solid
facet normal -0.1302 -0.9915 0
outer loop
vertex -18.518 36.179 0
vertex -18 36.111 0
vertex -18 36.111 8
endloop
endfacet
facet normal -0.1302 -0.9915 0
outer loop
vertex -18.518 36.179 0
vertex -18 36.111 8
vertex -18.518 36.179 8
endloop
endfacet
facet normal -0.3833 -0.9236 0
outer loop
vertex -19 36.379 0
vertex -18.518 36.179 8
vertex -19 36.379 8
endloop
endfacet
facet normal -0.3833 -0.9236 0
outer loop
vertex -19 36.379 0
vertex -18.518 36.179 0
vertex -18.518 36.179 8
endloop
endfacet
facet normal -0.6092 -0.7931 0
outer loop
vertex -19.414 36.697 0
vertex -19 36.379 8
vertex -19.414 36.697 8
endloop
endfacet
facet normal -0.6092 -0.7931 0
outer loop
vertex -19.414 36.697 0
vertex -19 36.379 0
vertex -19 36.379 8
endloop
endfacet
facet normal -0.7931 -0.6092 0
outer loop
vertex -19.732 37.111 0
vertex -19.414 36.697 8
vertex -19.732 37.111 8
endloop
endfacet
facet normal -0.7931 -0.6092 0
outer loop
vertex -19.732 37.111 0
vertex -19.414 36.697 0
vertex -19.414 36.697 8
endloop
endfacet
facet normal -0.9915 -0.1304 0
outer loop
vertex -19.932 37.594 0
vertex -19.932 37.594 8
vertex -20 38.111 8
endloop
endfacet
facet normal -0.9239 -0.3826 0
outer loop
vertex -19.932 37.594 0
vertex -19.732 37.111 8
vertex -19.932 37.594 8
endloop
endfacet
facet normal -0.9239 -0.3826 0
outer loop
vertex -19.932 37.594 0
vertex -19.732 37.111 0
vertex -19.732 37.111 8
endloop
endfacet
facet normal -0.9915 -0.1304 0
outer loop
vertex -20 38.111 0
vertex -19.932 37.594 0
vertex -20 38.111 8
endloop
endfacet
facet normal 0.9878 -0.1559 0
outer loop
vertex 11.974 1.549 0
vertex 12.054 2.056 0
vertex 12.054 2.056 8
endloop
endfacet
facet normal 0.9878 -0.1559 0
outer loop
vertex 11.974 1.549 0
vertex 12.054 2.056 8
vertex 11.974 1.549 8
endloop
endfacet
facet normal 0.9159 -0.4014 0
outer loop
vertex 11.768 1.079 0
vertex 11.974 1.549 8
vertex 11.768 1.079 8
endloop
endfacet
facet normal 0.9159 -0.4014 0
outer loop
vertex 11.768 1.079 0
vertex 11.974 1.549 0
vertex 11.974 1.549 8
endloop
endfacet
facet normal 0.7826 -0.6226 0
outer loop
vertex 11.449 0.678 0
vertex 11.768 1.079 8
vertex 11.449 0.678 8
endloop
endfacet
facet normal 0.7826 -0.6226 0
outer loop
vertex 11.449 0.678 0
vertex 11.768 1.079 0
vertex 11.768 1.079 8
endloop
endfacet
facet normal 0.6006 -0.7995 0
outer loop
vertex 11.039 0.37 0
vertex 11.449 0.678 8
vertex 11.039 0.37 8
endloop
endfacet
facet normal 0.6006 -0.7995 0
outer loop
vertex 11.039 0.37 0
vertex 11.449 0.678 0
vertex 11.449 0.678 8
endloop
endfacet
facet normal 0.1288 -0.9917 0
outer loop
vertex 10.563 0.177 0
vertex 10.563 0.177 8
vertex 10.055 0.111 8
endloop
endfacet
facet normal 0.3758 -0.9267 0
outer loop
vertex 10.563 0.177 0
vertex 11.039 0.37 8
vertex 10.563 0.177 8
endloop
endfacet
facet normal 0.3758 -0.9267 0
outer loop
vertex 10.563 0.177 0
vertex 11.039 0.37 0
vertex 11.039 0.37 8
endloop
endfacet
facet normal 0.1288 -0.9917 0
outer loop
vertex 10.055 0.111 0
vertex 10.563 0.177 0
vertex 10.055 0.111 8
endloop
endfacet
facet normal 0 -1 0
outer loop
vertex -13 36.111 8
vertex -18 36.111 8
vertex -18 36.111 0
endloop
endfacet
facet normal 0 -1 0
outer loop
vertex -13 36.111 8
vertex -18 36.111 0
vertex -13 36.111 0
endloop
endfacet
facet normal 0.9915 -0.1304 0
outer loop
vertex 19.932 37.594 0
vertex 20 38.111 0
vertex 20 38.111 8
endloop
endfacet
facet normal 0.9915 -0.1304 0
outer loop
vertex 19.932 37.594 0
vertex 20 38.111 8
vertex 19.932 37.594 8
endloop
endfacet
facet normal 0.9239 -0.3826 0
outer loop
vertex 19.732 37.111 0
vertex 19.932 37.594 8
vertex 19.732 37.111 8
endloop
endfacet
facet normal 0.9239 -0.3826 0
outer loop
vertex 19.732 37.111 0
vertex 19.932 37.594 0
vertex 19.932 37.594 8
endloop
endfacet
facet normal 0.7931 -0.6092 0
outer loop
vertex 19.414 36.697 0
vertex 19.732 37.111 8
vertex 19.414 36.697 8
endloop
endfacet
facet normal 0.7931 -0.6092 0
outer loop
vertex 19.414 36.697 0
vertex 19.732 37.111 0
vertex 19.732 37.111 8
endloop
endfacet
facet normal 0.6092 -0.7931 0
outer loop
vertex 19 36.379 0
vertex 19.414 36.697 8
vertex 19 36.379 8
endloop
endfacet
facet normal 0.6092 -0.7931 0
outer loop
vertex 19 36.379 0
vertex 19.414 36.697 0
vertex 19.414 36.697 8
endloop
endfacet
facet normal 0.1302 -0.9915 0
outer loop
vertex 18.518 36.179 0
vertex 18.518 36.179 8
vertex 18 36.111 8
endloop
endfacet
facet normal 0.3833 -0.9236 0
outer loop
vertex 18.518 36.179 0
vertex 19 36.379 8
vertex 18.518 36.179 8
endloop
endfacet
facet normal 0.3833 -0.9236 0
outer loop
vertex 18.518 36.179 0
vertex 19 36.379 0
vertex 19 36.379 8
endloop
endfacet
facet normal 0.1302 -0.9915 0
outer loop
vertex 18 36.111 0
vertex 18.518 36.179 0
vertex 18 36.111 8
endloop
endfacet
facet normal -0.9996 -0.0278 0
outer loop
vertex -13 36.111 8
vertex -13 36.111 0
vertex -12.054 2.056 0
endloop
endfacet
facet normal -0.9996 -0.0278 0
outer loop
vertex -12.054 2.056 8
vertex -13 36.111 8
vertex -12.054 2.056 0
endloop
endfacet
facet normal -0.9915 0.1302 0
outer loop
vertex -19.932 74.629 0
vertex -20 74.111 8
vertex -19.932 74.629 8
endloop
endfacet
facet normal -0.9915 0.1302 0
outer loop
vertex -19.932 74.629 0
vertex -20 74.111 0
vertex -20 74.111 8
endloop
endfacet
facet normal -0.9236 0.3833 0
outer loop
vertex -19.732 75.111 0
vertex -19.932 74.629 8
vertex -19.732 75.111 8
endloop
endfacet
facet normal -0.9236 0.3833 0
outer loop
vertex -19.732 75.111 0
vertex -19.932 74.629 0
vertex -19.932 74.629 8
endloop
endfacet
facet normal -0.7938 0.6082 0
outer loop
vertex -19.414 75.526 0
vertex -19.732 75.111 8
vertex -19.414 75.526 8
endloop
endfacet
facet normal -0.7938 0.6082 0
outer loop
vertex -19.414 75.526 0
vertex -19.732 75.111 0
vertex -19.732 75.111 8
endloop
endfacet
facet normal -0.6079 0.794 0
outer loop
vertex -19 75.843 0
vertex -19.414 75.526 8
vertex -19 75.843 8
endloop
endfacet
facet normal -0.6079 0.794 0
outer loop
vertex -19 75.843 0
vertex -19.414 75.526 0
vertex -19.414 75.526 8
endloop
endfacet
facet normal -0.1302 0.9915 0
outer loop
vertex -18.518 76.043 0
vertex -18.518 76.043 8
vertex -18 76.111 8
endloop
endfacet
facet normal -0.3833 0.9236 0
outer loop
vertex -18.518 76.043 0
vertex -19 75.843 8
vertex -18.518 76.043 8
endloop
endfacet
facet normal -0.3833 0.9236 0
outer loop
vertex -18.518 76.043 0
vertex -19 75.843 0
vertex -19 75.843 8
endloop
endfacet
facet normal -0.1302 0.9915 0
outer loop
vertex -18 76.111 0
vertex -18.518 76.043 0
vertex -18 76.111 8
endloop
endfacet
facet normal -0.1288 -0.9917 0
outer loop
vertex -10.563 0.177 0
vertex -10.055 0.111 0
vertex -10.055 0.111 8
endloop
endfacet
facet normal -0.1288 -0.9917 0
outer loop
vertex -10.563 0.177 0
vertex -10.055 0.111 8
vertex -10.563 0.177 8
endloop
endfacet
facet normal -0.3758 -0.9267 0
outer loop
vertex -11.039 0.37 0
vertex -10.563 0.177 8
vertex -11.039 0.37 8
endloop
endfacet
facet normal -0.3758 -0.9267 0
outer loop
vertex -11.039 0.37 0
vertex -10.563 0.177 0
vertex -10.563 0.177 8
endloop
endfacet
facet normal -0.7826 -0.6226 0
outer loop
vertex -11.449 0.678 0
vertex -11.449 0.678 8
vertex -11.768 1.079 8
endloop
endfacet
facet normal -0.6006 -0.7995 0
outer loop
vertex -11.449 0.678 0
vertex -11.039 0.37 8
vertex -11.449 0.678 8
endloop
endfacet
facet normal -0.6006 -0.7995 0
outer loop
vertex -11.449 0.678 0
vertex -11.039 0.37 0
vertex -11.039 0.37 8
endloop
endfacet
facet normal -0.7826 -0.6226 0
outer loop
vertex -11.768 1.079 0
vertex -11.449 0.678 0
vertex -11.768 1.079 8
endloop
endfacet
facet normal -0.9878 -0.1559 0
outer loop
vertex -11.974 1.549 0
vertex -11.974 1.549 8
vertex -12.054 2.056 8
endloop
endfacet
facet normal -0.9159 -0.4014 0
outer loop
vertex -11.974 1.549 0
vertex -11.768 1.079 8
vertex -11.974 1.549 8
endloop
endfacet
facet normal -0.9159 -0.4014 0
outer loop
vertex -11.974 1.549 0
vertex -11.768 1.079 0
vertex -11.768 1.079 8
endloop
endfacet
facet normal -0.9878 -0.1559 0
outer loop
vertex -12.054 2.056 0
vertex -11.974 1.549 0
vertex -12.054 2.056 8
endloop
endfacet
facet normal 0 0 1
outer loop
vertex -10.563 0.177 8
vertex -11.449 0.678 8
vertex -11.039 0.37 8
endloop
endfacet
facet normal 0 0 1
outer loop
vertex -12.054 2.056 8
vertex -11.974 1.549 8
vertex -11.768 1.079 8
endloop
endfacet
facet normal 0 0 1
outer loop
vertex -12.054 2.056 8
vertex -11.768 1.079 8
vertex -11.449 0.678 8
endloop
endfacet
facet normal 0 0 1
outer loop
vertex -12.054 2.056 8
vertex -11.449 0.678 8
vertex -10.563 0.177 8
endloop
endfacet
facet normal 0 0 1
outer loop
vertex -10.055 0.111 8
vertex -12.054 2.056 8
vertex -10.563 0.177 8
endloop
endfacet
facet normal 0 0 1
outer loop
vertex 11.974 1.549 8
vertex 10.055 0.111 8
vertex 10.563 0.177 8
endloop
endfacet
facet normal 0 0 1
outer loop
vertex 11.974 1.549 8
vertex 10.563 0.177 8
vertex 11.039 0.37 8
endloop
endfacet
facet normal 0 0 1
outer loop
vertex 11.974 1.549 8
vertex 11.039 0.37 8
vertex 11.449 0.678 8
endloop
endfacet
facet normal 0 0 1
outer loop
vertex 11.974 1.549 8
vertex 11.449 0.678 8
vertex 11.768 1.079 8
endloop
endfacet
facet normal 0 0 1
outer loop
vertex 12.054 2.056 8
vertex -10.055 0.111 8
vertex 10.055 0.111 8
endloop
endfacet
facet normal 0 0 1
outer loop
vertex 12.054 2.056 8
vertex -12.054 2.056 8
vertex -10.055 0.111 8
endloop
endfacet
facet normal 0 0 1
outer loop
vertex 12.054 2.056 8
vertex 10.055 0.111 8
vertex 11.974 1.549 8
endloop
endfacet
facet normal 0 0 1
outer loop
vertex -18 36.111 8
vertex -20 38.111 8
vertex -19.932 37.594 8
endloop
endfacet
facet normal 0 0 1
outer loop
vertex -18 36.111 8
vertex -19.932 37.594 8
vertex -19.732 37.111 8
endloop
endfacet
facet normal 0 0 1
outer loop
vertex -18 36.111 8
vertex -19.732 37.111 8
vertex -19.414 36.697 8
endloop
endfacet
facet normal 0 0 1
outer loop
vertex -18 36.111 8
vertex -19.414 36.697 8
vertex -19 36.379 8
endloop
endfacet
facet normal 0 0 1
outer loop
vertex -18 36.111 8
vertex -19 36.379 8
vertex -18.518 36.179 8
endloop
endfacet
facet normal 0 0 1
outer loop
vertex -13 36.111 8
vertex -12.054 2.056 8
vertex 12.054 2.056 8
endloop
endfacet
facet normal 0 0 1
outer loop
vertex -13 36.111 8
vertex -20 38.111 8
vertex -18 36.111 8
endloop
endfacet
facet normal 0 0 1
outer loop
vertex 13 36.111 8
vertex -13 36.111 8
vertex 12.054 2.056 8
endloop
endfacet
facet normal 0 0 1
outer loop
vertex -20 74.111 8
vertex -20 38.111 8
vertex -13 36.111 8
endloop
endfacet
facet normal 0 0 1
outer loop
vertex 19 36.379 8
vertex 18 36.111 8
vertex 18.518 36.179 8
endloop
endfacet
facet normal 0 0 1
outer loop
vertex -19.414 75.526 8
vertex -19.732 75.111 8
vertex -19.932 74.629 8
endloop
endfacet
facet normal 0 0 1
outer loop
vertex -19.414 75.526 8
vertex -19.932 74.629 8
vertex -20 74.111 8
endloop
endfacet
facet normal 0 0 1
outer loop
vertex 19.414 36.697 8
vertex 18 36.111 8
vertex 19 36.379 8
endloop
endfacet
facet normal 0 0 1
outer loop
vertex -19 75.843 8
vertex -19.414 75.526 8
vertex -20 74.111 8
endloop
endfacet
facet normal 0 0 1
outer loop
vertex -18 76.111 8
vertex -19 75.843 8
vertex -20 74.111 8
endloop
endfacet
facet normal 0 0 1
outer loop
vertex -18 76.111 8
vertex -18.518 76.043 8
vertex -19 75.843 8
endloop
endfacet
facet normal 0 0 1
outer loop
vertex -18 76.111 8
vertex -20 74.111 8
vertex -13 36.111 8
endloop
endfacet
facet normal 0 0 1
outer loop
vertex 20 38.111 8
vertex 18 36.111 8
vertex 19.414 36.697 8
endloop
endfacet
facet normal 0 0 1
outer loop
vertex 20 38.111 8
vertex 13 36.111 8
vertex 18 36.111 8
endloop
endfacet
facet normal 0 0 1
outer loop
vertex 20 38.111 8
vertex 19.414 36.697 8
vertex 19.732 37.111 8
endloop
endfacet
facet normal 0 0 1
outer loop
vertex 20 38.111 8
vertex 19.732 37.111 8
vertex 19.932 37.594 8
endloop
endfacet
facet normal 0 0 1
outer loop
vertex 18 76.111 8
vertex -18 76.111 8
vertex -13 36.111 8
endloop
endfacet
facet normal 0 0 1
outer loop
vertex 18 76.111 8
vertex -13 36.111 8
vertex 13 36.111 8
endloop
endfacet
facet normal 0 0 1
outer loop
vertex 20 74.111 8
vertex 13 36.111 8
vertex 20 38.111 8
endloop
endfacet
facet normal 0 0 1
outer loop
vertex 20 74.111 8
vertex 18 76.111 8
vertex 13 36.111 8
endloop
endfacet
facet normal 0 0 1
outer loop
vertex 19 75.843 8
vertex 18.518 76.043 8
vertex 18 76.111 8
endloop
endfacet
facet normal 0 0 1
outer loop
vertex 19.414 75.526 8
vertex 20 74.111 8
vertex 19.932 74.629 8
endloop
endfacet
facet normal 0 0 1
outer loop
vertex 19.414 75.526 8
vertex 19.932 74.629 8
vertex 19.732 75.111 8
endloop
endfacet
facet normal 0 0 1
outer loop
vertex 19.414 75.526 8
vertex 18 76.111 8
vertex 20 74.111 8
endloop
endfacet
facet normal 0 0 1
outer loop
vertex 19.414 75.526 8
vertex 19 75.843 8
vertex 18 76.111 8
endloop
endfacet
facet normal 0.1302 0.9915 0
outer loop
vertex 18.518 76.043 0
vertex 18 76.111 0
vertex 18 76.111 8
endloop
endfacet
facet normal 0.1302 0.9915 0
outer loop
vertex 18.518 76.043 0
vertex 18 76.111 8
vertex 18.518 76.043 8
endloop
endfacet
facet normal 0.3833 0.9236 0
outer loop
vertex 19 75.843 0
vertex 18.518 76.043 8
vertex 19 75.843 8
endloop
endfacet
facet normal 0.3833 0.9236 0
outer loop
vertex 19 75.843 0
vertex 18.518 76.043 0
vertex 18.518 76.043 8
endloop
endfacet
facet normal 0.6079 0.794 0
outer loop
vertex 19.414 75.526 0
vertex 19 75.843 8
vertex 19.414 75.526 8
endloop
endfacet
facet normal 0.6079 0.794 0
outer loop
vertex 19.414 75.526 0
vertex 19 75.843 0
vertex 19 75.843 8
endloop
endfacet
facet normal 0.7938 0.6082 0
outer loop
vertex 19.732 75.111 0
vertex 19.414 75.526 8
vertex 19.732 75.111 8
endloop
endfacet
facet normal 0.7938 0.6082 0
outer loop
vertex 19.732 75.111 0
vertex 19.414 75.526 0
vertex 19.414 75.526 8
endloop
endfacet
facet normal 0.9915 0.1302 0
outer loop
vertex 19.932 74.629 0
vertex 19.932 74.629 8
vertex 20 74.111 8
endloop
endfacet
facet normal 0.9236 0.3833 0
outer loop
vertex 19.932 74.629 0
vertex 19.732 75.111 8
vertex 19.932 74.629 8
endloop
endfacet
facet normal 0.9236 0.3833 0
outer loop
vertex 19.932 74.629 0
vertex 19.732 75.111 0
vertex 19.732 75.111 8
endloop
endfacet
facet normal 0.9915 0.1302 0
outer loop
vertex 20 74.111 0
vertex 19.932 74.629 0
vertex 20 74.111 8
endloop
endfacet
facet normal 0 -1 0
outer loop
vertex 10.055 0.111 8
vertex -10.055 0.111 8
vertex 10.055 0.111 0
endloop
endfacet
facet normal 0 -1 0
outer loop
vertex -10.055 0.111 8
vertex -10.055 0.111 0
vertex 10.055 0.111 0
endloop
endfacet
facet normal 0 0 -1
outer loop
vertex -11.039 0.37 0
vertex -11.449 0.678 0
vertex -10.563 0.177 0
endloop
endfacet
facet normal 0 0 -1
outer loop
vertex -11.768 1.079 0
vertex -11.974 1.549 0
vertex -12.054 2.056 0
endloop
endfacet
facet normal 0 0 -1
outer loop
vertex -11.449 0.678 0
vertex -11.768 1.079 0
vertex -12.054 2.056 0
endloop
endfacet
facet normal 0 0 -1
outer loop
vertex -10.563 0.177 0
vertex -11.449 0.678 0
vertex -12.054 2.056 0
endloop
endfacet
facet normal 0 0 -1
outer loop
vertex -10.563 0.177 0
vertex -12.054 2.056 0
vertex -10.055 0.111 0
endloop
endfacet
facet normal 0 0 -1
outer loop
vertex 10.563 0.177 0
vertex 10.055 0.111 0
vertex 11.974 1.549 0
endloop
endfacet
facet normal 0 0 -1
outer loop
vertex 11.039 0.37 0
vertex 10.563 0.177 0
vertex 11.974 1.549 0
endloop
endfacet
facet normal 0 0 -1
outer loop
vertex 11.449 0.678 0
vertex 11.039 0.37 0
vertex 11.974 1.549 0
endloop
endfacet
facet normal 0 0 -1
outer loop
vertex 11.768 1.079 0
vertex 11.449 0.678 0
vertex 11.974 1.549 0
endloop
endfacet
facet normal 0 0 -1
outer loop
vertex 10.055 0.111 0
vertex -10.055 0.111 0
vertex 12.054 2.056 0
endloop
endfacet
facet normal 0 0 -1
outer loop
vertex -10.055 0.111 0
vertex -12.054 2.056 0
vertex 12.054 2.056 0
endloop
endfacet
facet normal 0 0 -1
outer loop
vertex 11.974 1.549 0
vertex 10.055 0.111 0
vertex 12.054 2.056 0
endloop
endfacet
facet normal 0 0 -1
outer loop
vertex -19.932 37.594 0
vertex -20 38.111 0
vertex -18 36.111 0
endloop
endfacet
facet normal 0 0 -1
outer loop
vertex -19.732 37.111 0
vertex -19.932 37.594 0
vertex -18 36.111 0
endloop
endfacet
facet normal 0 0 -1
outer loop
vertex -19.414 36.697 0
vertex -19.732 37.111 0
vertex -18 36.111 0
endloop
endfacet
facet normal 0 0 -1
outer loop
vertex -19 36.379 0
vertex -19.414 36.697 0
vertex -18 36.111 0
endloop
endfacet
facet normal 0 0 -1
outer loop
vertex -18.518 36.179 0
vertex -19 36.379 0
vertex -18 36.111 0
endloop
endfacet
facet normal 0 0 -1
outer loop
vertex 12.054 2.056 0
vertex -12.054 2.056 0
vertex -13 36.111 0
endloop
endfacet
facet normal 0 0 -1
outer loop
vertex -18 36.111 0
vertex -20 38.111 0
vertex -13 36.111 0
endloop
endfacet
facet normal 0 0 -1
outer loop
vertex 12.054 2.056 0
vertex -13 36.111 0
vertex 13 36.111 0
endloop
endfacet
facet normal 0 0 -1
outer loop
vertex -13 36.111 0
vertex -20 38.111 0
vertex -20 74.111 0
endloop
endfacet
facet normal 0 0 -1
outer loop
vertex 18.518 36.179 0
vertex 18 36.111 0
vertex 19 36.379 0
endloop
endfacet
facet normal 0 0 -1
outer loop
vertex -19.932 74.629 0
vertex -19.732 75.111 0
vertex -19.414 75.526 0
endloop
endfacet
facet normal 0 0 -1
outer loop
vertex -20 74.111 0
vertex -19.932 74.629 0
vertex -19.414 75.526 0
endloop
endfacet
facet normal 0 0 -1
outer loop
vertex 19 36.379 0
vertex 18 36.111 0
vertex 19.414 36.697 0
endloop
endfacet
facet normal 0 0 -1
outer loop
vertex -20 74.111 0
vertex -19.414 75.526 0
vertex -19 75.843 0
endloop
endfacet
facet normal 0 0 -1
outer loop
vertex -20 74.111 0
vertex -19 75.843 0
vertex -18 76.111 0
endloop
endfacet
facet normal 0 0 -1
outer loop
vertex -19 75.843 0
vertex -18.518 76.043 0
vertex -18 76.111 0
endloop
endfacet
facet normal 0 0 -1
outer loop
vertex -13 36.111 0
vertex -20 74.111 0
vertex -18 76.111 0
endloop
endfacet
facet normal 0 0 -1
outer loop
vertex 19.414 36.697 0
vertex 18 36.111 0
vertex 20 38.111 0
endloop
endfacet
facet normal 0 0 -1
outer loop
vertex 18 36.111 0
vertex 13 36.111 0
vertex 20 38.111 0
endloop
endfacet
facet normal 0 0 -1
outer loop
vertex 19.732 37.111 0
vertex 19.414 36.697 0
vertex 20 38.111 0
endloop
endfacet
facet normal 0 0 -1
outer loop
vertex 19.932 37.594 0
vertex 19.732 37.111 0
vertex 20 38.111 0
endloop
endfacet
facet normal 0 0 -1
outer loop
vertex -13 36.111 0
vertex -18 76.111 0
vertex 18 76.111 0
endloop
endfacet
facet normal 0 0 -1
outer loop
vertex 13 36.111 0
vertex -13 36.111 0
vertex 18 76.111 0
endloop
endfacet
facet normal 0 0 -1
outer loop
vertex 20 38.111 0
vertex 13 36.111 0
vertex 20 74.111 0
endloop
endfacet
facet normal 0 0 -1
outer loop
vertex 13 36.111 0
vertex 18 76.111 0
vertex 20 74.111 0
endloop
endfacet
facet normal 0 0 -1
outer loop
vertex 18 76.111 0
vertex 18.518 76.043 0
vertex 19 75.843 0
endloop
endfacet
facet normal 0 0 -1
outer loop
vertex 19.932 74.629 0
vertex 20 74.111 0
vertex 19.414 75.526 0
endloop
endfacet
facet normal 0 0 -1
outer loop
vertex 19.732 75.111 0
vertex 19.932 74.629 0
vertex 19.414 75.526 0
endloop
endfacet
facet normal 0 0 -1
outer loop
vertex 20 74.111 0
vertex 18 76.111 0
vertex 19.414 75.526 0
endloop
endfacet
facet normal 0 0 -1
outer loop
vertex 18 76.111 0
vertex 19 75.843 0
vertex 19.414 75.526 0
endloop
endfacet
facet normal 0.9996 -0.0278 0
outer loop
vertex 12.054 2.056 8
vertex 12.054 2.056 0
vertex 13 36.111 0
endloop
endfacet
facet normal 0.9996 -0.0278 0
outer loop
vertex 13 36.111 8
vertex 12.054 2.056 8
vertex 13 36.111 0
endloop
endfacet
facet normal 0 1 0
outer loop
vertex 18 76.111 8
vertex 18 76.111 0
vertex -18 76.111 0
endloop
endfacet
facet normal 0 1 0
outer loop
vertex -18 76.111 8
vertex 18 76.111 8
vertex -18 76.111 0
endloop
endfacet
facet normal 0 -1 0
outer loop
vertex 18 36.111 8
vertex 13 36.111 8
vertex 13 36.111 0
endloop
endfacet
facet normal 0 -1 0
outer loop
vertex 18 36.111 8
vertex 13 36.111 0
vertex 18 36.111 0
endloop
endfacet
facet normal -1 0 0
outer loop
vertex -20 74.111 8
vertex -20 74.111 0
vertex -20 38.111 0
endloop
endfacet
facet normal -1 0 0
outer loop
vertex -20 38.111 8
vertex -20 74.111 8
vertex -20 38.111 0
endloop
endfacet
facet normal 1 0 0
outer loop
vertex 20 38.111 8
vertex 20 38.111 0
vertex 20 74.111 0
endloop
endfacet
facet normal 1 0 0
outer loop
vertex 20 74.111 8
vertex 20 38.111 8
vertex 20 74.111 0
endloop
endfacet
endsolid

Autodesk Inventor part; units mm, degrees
ref_plane "YZ Plane" through (0, 0, 0) normal (1, 0, 0) x (0, 1, 0)
ref_plane "XZ Plane" through (0, 0, 0) normal (0, 1, 0) x (-1, 0, 0)
ref_plane "XY Plane" through (0, 0, 0) normal (0, 0, 1) x (1, 0, 0)
sketch "Sketch1" plane through (0, 0, 0) normal (0, 0, 1) x (1, 0, 0)
  line L0 (0, 0) -> (0, 17.1478) construction
  line L1 (-10.0548, 0.1113) -> (10.0548, 0.1113)
  line L2 (12.054, 2.0558) -> (13, 36.1113)
  line L3 (13, 36.1113) -> (18, 36.1113)
  line L4 (20, 38.1113) -> (20, 74.1113)
  line L5 (18, 76.1113) -> (-18, 76.1113)
  line L6 (-20, 74.1113) -> (-20, 38.1113)
  line L7 (-18, 36.1113) -> (-13, 36.1113)
  line L8 (-13, 36.1113) -> (-12.054, 2.0558)
  arc A0 (-18, 76.1113) -> (-20, 74.1113) centre (-18, 74.1113) ccw
  arc A1 (20, 74.1113) -> (18, 76.1113) centre (18, 74.1113) ccw
  arc A2 (-20, 38.1113) -> (-18, 36.1113) centre (-18, 38.1113) ccw
  arc A3 (18, 36.1113) -> (20, 38.1113) centre (18, 38.1113) ccw
  arc A4 (-12.054, 2.0558) -> (-10.0548, 0.1113) centre (-10.0548, 2.1113) ccw
  arc A5 (10.0548, 0.1113) -> (12.054, 2.0558) centre (10.0548, 2.1113) ccw
  point P0 (-12, 0.1113)
  point P1 (12, 0.1113)
  point P2 (20, 36.1113)
  point P3 (20, 76.1113)
  point P4 (-20, 76.1113)
  dimension "d0" = 24
  dimension "d1" = 26
  dimension "d2" = 40
  dimension "d3" = 36
  dimension "d4" = 40
  dimension "d5" = 2
extrude "Plate1" add sketch "Sketch1" along normal blind 8
equation "\"d6\" = Thickness"
equation "\"BendRadius\" = Thickness"
equation "\"BendReliefWidth\" = Thickness"
equation "\"BendReliefDepth\" = 0.5 * Thickness"
equation "\"CornerReliefSize\" = 4 * Thickness"
equation "\"MinimumRemnant\" = 2 * Thickness"
equation "\"TransitionRadius\" = BendRadius"
equation "\"JacobiRadiusSize\" = BendRadius"
equation "\"GapSize\" = Thickness"
equation "\"Thickness\" = 8"
properties part number "hage" material "S235JR"
